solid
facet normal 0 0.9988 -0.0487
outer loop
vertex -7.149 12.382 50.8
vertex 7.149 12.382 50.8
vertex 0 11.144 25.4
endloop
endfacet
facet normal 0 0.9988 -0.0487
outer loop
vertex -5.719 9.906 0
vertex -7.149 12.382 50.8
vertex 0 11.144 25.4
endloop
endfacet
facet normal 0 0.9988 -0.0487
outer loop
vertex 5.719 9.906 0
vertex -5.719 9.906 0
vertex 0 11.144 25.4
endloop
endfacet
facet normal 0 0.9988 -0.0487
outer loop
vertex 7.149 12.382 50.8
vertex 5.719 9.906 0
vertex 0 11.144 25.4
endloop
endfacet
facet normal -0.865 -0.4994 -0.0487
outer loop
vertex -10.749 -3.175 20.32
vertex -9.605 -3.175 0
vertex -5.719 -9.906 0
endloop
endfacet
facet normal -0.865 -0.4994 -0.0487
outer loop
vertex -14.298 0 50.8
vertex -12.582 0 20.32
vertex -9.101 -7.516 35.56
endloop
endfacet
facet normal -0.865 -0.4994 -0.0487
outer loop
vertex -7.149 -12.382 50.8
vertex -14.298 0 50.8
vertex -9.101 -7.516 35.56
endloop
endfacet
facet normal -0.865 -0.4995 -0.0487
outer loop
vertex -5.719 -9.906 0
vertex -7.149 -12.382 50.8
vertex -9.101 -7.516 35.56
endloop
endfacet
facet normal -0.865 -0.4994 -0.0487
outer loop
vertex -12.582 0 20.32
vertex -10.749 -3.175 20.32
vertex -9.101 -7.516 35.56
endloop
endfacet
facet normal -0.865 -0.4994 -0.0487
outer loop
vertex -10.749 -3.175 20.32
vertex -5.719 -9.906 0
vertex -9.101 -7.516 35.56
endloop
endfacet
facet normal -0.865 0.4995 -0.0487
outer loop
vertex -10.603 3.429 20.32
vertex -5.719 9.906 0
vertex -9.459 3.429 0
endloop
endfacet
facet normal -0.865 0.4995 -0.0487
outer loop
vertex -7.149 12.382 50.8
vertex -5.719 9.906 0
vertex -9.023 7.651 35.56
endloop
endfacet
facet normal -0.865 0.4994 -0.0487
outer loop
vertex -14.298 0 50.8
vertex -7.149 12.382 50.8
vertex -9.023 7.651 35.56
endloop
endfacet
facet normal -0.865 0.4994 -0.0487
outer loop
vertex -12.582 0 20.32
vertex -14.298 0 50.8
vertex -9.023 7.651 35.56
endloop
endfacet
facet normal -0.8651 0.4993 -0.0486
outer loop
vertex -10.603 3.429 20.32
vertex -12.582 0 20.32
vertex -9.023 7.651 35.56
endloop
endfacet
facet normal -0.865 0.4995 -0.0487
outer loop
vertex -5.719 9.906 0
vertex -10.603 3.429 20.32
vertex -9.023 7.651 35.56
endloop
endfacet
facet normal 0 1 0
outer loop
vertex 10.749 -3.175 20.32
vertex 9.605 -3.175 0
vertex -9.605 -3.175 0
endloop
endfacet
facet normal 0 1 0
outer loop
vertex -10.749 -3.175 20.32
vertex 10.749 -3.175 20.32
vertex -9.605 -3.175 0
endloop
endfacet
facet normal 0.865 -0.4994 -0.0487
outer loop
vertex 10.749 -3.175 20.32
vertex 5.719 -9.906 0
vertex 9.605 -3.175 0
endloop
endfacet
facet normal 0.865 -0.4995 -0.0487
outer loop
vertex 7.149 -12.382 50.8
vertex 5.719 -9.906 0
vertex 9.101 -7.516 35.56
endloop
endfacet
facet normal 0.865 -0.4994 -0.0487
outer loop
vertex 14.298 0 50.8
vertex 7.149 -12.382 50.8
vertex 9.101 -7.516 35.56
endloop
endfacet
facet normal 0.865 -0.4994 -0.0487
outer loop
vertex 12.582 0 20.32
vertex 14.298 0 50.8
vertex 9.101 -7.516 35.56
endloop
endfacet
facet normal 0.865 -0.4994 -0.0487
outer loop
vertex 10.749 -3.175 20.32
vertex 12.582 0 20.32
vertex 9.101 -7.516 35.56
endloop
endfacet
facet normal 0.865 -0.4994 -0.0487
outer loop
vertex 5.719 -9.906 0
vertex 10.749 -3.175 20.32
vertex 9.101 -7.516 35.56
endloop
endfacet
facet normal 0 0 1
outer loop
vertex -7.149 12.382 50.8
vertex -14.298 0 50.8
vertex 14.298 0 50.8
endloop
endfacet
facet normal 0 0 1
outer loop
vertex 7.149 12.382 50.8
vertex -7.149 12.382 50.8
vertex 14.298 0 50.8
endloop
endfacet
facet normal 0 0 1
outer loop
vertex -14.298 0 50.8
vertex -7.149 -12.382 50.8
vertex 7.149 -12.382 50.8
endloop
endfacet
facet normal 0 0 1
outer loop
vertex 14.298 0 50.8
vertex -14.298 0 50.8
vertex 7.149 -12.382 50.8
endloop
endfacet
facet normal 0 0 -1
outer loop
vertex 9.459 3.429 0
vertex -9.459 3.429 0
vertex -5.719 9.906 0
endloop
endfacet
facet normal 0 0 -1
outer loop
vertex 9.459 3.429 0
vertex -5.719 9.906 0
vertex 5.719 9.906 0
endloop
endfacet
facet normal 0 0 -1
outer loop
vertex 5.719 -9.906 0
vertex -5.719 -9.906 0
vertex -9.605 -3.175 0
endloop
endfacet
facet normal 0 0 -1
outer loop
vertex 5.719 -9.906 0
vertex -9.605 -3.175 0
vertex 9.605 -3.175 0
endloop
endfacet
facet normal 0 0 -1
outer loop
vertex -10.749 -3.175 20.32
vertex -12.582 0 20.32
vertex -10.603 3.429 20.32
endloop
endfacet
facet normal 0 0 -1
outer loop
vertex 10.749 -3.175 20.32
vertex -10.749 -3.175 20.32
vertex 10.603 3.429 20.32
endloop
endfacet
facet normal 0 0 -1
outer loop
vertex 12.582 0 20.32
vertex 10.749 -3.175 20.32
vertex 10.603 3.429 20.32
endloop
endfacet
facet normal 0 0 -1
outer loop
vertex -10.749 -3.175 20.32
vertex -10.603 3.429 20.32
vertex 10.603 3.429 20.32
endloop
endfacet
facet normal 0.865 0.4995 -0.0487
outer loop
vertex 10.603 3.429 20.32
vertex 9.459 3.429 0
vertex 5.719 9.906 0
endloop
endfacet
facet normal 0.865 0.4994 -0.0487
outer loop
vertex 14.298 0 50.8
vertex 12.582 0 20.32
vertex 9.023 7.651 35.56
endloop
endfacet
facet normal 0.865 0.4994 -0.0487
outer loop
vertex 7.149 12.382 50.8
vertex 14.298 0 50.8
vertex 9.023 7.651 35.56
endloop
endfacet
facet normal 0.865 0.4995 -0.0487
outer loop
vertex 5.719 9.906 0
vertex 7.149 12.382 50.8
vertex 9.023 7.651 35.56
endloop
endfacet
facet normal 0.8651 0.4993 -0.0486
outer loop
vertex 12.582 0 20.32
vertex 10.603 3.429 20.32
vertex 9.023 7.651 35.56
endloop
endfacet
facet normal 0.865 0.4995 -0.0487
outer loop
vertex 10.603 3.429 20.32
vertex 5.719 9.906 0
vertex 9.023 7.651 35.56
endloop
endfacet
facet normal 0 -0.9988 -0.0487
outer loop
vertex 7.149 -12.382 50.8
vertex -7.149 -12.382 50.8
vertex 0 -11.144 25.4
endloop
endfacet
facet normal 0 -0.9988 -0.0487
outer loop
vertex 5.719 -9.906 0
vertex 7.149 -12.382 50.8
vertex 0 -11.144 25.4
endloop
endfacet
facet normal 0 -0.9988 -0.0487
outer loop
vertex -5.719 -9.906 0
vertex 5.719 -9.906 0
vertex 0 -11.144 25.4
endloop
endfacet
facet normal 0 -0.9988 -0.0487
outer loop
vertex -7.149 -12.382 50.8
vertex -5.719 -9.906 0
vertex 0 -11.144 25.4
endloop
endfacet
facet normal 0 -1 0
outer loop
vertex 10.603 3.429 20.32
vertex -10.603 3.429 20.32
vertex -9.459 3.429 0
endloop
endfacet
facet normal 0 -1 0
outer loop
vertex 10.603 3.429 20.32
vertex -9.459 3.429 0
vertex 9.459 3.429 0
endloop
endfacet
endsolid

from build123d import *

# Parameters (mm, degrees)
CUT_EXTRUDE1_DEPTH = 20.32


with BuildPart() as part:
    # Sketch2 → Loft1 section 0
    with BuildSketch(Plane.XY.offset(50.8)):
        with BuildLine():
            Line((-14.298079416, 0), (-7.149039708, -12.3825))
            Line((-7.149039708, -12.3825), (7.149039708, -12.3825))
            Line((7.149039708, -12.3825), (14.298079416, 0))
            Line((14.298079416, 0), (7.149039708, 12.3825))
            Line((7.149039708, 12.3825), (-7.149039708, 12.3825))
            Line((-7.149039708, 12.3825), (-14.298079416, 0))
        make_face()
    # Sketch1 → Loft1 section 1
    with BuildSketch(Plane.XY):
        with BuildLine():
            Line((11.438463533, 0), (5.719231767, 9.906))
            Line((5.719231767, 9.906), (-5.719231767, 9.906))
            Line((-5.719231767, 9.906), (-11.438463533, 0))
            Line((-11.438463533, 0), (-5.719231767, -9.906))
            Line((-5.719231767, -9.906), (5.719231767, -9.906))
            Line((5.719231767, -9.906), (11.438463533, 0))
        make_face()
    loft()

    # Sketch4 → Cut-Extrude1 (cut)
    with BuildSketch(Plane(origin=(0, 0, 0), x_dir=(-1, 0, 0), z_dir=(0, 0, -1))):
        Polygon((-9.45872946, 3.429), (9.45872946, 3.429), (15.693203295, 3.429), (15.693203295, -3.175), (9.605376429, -3.175), (-9.605376429, -3.175), (-15.693203295, -3.175), (-15.693203295, 3.429), align=None)
    extrude(amount=-CUT_EXTRUDE1_DEPTH, mode=Mode.SUBTRACT)


solid = part.part
